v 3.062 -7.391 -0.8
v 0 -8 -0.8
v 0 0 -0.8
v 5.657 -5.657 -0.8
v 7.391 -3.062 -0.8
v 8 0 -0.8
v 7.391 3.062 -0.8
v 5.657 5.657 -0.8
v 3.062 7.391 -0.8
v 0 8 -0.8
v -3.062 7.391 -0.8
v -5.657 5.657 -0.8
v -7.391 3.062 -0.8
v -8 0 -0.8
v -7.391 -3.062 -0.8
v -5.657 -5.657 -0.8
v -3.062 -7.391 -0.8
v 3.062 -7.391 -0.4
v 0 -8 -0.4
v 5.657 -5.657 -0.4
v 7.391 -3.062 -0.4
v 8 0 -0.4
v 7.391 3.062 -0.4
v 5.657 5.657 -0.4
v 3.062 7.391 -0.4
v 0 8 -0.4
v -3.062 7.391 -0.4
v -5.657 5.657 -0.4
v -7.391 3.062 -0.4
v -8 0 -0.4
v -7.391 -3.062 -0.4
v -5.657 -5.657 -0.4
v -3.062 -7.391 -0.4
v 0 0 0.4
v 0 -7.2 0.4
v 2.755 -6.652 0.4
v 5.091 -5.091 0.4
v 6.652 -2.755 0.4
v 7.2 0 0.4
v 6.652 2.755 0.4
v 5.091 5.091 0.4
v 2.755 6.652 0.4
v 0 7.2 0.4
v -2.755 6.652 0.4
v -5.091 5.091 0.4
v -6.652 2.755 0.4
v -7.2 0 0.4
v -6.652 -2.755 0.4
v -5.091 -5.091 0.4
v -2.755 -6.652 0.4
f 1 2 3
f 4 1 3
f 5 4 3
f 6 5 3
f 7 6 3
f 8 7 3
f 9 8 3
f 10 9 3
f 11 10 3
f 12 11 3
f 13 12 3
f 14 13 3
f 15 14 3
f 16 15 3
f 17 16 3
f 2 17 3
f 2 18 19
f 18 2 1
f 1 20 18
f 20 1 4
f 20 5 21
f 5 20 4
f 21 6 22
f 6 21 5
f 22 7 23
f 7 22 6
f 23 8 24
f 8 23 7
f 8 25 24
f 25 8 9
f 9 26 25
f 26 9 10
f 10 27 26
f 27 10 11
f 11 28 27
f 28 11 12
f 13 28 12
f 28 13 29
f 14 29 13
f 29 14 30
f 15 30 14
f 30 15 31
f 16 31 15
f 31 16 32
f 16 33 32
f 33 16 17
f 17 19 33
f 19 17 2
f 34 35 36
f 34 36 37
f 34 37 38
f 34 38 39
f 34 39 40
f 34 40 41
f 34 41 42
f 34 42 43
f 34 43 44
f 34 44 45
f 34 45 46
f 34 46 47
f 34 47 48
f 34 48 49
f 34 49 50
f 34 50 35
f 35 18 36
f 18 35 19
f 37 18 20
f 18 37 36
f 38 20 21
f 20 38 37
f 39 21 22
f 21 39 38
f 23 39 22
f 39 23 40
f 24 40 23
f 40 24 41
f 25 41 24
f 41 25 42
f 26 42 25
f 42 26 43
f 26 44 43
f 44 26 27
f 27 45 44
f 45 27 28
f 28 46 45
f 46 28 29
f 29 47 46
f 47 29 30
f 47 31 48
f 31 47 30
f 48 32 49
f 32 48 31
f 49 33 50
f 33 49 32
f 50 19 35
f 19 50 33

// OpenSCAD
// file: ../p/4-4cyli.scad
use <../lib.scad>
function ldraw_lib__4_4cyli() = [
// 0 Cylinder 1.0
// 0 Name: 4-4cyli.dat
// 0 Author: James Jessiman
// 0 !LDRAW_ORG Primitive UPDATE 2005-01
// 0 !LICENSE Licensed under CC BY 2.0 and CC BY 4.0 : see CAreadme.txt
// 
// 0 BFC CERTIFY CCW
  [0,"BFC","CERTIFY"],
  [0,"BFC","CCW"],
// 
// 0 !HISTORY 1998-12-15 [PTadmin] Official Update 1998-10
// 0 !HISTORY 2002-03-23 [sbliss] Added BFC statement; merged headers from files in distributions LDraw 0.27 and Complete.
// 0 !HISTORY 2002-04-25 [PTadmin] Official Update 2002-02
// 0 !HISTORY 2004-12-14 [guyvivan] BFC CCW
// 0 !HISTORY 2005-12-28 [PTadmin] Official Update 2005-01
// 0 !HISTORY 2007-06-24 [PTadmin] Header formatted for Contributor Agreement
// 0 !HISTORY 2008-07-01 [PTadmin] Official Update 2008-01
// 
// 
// 4 16 1 1 0 0.9239 1 0.3827 0.9239 0 0.3827 1 0 0
  [4,16,1,1,0,0.9239,1,0.3827,0.9239,0,0.3827,1,0,0],
// 5 24 1 0 0 1 1 0 0.9239 0 0.3827 0.9239 0 -0.3827
  [5,24,1,0,0,1,1,0,0.9239,0,0.3827,0.9239,0,-0.3827],
// 4 16 0.9239 1 0.3827 0.7071 1 0.7071 0.7071 0 0.7071 0.9239 0 0.3827
  [4,16,0.9239,1,0.3827,0.7071,1,0.7071,0.7071,0,0.7071,0.9239,0,0.3827],
// 5 24 0.9239 0 0.3827 0.9239 1 0.3827 0.7071 0 0.7071 1 0 0
  [5,24,0.9239,0,0.3827,0.9239,1,0.3827,0.7071,0,0.7071,1,0,0],
// 4 16 0.7071 1 0.7071 0.3827 1 0.9239 0.3827 0 0.9239 0.7071 0 0.7071
  [4,16,0.7071,1,0.7071,0.3827,1,0.9239,0.3827,0,0.9239,0.7071,0,0.7071],
// 5 24 0.7071 0 0.7071 0.7071 1 0.7071 0.3827 0 0.9239 0.9239 0 0.3827
  [5,24,0.7071,0,0.7071,0.7071,1,0.7071,0.3827,0,0.9239,0.9239,0,0.3827],
// 4 16 0.3827 1 0.9239 0 1 1 0 0 1 0.3827 0 0.9239
  [4,16,0.3827,1,0.9239,0,1,1,0,0,1,0.3827,0,0.9239],
// 5 24 0.3827 0 0.9239 0.3827 1 0.9239 0 0 1 0.7071 0 0.7071
  [5,24,0.3827,0,0.9239,0.3827,1,0.9239,0,0,1,0.7071,0,0.7071],
// 4 16 0 1 1 -0.3827 1 0.9239 -0.3827 0 0.9239 0 0 1
  [4,16,0,1,1,-0.3827,1,0.9239,-0.3827,0,0.9239,0,0,1],
// 5 24 0 0 1 0 1 1 -0.3827 0 0.9239 0.3827 0 0.9239
  [5,24,0,0,1,0,1,1,-0.3827,0,0.9239,0.3827,0,0.9239],
// 4 16 -0.3827 1 0.9239 -0.7071 1 0.7071 -0.7071 0 0.7071 -0.3827 0 0.9239
  [4,16,-0.3827,1,0.9239,-0.7071,1,0.7071,-0.7071,0,0.7071,-0.3827,0,0.9239],
// 5 24 -0.3827 0 0.9239 -0.3827 1 0.9239 -0.7071 0 0.7071 0 0 1
  [5,24,-0.3827,0,0.9239,-0.3827,1,0.9239,-0.7071,0,0.7071,0,0,1],
// 4 16 -0.7071 1 0.7071 -0.9239 1 0.3827 -0.9239 0 0.3827 -0.7071 0 0.7071
  [4,16,-0.7071,1,0.7071,-0.9239,1,0.3827,-0.9239,0,0.3827,-0.7071,0,0.7071],
// 5 24 -0.7071 0 0.7071 -0.7071 1 0.7071 -0.9239 0 0.3827 -0.3827 0 0.9239
  [5,24,-0.7071,0,0.7071,-0.7071,1,0.7071,-0.9239,0,0.3827,-0.3827,0,0.9239],
// 4 16 -0.9239 1 0.3827 -1 1 0 -1 0 0 -0.9239 0 0.3827
  [4,16,-0.9239,1,0.3827,-1,1,0,-1,0,0,-0.9239,0,0.3827],
// 5 24 -0.9239 0 0.3827 -0.9239 1 0.3827 -1 0 0 -0.7071 0 0.7071
  [5,24,-0.9239,0,0.3827,-0.9239,1,0.3827,-1,0,0,-0.7071,0,0.7071],
// 4 16 -1 1 0 -0.9239 1 -0.3827 -0.9239 0 -0.3827 -1 0 0
  [4,16,-1,1,0,-0.9239,1,-0.3827,-0.9239,0,-0.3827,-1,0,0],
// 5 24 -1 0 0 -1 1 0 -0.9239 0 -0.3827 -0.9239 0 0.3827
  [5,24,-1,0,0,-1,1,0,-0.9239,0,-0.3827,-0.9239,0,0.3827],
// 4 16 -0.9239 1 -0.3827 -0.7071 1 -0.7071 -0.7071 0 -0.7071 -0.9239 0 -0.3827
  [4,16,-0.9239,1,-0.3827,-0.7071,1,-0.7071,-0.7071,0,-0.7071,-0.9239,0,-0.3827],
// 5 24 -0.9239 0 -0.3827 -0.9239 1 -0.3827 -0.7071 0 -0.7071 -1 0 0
  [5,24,-0.9239,0,-0.3827,-0.9239,1,-0.3827,-0.7071,0,-0.7071,-1,0,0],
// 4 16 -0.7071 1 -0.7071 -0.3827 1 -0.9239 -0.3827 0 -0.9239 -0.7071 0 -0.7071
  [4,16,-0.7071,1,-0.7071,-0.3827,1,-0.9239,-0.3827,0,-0.9239,-0.7071,0,-0.7071],
// 5 24 -0.7071 0 -0.7071 -0.7071 1 -0.7071 -0.3827 0 -0.9239 -0.9239 0 -0.3827
  [5,24,-0.7071,0,-0.7071,-0.7071,1,-0.7071,-0.3827,0,-0.9239,-0.9239,0,-0.3827],
// 4 16 -0.3827 1 -0.9239 0 1 -1 0 0 -1 -0.3827 0 -0.9239
  [4,16,-0.3827,1,-0.9239,0,1,-1,0,0,-1,-0.3827,0,-0.9239],
// 5 24 -0.3827 0 -0.9239 -0.3827 1 -0.9239 0 0 -1 -0.7071 0 -0.7071
  [5,24,-0.3827,0,-0.9239,-0.3827,1,-0.9239,0,0,-1,-0.7071,0,-0.7071],
// 4 16 0 1 -1 0.3827 1 -0.9239 0.3827 0 -0.9239 0 0 -1
  [4,16,0,1,-1,0.3827,1,-0.9239,0.3827,0,-0.9239,0,0,-1],
// 5 24 0 0 -1 0 1 -1 0.3827 0 -0.9239 -0.3827 0 -0.9239
  [5,24,0,0,-1,0,1,-1,0.3827,0,-0.9239,-0.3827,0,-0.9239],
// 4 16 0.3827 1 -0.9239 0.7071 1 -0.7071 0.7071 0 -0.7071 0.3827 0 -0.9239
  [4,16,0.3827,1,-0.9239,0.7071,1,-0.7071,0.7071,0,-0.7071,0.3827,0,-0.9239],
// 5 24 0.3827 0 -0.9239 0.3827 1 -0.9239 0.7071 0 -0.7071 0 0 -1
  [5,24,0.3827,0,-0.9239,0.3827,1,-0.9239,0.7071,0,-0.7071,0,0,-1],
// 4 16 0.7071 1 -0.7071 0.9239 1 -0.3827 0.9239 0 -0.3827 0.7071 0 -0.7071
  [4,16,0.7071,1,-0.7071,0.9239,1,-0.3827,0.9239,0,-0.3827,0.7071,0,-0.7071],
// 5 24 0.7071 0 -0.7071 0.7071 1 -0.7071 0.9239 0 -0.3827 0.3827 0 -0.9239
  [5,24,0.7071,0,-0.7071,0.7071,1,-0.7071,0.9239,0,-0.3827,0.3827,0,-0.9239],
// 4 16 0.9239 1 -0.3827 1 1 0 1 0 0 0.9239 0 -0.3827
  [4,16,0.9239,1,-0.3827,1,1,0,1,0,0,0.9239,0,-0.3827],
// 5 24 0.9239 0 -0.3827 0.9239 1 -0.3827 1 0 0 0.7071 0 -0.7071
  [5,24,0.9239,0,-0.3827,0.9239,1,-0.3827,1,0,0,0.7071,0,-0.7071],
// 0
];
makepoly(ldraw_lib__4_4cyli(), line=0.2);
// file: ../p/4-4edge.scad
use <../lib.scad>
function ldraw_lib__4_4edge() = [
// 0 Circle 1.0
// 0 Name: 4-4edge.dat
// 0 Author: James Jessiman
// 0 !LDRAW_ORG Primitive UPDATE 2017-01
// 0 !LICENSE Licensed under CC BY 2.0 and CC BY 4.0 : see CAreadme.txt
// 
// 0 BFC CERTIFY CCW
  [0,"BFC","CERTIFY"],
  [0,"BFC","CCW"],
// 
// 0 !HISTORY 1998-12-15 [PTadmin] Official Update 1998-10
// 0 !HISTORY 2005-12-28 [PTadmin] Official Update 2005-01
// 0 !HISTORY 2007-06-24 [PTadmin] Header formatted for Contributor Agreement
// 0 !HISTORY 2008-07-01 [PTadmin] Official Update 2008-01
// 0 !HISTORY 2017-01-15 [Steffen] BFCed
// 0 !HISTORY 2017-12-30 [PTadmin] Official Update 2017-01
// 
// 
// 2 24 1 0 0 0.9239 0 0.3827
  [2,24,1,0,0,0.9239,0,0.3827],
// 2 24 0.9239 0 0.3827 0.7071 0 0.7071
  [2,24,0.9239,0,0.3827,0.7071,0,0.7071],
// 2 24 0.7071 0 0.7071 0.3827 0 0.9239
  [2,24,0.7071,0,0.7071,0.3827,0,0.9239],
// 2 24 0.3827 0 0.9239 0 0 1
  [2,24,0.3827,0,0.9239,0,0,1],
// 2 24 0 0 1 -0.3827 0 0.9239
  [2,24,0,0,1,-0.3827,0,0.9239],
// 2 24 -0.3827 0 0.9239 -0.7071 0 0.7071
  [2,24,-0.3827,0,0.9239,-0.7071,0,0.7071],
// 2 24 -0.7071 0 0.7071 -0.9239 0 0.3827
  [2,24,-0.7071,0,0.7071,-0.9239,0,0.3827],
// 2 24 -0.9239 0 0.3827 -1 0 -0
  [2,24,-0.9239,0,0.3827,-1,0,-0],
// 2 24 -1 0 -0 -0.9239 0 -0.3827
  [2,24,-1,0,-0,-0.9239,0,-0.3827],
// 2 24 -0.9239 0 -0.3827 -0.7071 0 -0.7071
  [2,24,-0.9239,0,-0.3827,-0.7071,0,-0.7071],
// 2 24 -0.7071 0 -0.7071 -0.3827 0 -0.9239
  [2,24,-0.7071,0,-0.7071,-0.3827,0,-0.9239],
// 2 24 -0.3827 0 -0.9239 0 0 -1
  [2,24,-0.3827,0,-0.9239,0,0,-1],
// 2 24 0 0 -1 0.3827 0 -0.9239
  [2,24,0,0,-1,0.3827,0,-0.9239],
// 2 24 0.3827 0 -0.9239 0.7071 0 -0.7071
  [2,24,0.3827,0,-0.9239,0.7071,0,-0.7071],
// 2 24 0.7071 0 -0.7071 0.9239 0 -0.3827
  [2,24,0.7071,0,-0.7071,0.9239,0,-0.3827],
// 2 24 0.9239 0 -0.3827 1 0 0
  [2,24,0.9239,0,-0.3827,1,0,0],
];
makepoly(ldraw_lib__4_4edge(), line=0.2);
// file: ../p/4-4disc.scad
use <../lib.scad>
function ldraw_lib__4_4disc() = [
// 0 Disc 1.0
// 0 Name: 4-4disc.dat
// 0 Author: James Jessiman
// 0 !LDRAW_ORG Primitive UPDATE 2002-02
// 0 !LICENSE Licensed under CC BY 2.0 and CC BY 4.0 : see CAreadme.txt
// 
// 0 BFC CERTIFY CCW
  [0,"BFC","CERTIFY"],
  [0,"BFC","CCW"],
// 
// 0 !HISTORY 1998-12-15 [PTadmin] Official Update 1998-10
// 0 !HISTORY 2002-03-23 [sbliss] Added BFC statement
// 0 !HISTORY 2002-04-25 [PTadmin] Official Update 2002-02
// 0 !HISTORY 2007-06-24 [PTadmin] Header formatted for Contributor Agreement
// 0 !HISTORY 2008-07-01 [PTadmin] Official Update 2008-01
// 
// 
// 3 16 0 0 0 1 0 0 0.9239 0 0.3827
  [3,16,0,0,0,1,0,0,0.9239,0,0.3827],
// 3 16 0 0 0 0.9239 0 0.3827 0.7071 0 0.7071
  [3,16,0,0,0,0.9239,0,0.3827,0.7071,0,0.7071],
// 3 16 0 0 0 0.7071 0 0.7071 0.3827 0 0.9239
  [3,16,0,0,0,0.7071,0,0.7071,0.3827,0,0.9239],
// 3 16 0 0 0 0.3827 0 0.9239 0 0 1
  [3,16,0,0,0,0.3827,0,0.9239,0,0,1],
// 3 16 0 0 0 0 0 1 -0.3827 0 0.9239
  [3,16,0,0,0,0,0,1,-0.3827,0,0.9239],
// 3 16 0 0 0 -0.3827 0 0.9239 -0.7071 0 0.7071
  [3,16,0,0,0,-0.3827,0,0.9239,-0.7071,0,0.7071],
// 3 16 0 0 0 -0.7071 0 0.7071 -0.9239 0 0.3827
  [3,16,0,0,0,-0.7071,0,0.7071,-0.9239,0,0.3827],
// 3 16 0 0 0 -0.9239 0 0.3827 -1 0 -0
  [3,16,0,0,0,-0.9239,0,0.3827,-1,0,-0],
// 3 16 0 0 0 -1 0 -0 -0.9239 0 -0.3827
  [3,16,0,0,0,-1,0,-0,-0.9239,0,-0.3827],
// 3 16 0 0 0 -0.9239 0 -0.3827 -0.7071 0 -0.7071
  [3,16,0,0,0,-0.9239,0,-0.3827,-0.7071,0,-0.7071],
// 3 16 0 0 0 -0.7071 0 -0.7071 -0.3827 0 -0.9239
  [3,16,0,0,0,-0.7071,0,-0.7071,-0.3827,0,-0.9239],
// 3 16 0 0 0 -0.3827 0 -0.9239 0 0 -1
  [3,16,0,0,0,-0.3827,0,-0.9239,0,0,-1],
// 3 16 0 0 0 0 0 -1 0.3827 0 -0.9239
  [3,16,0,0,0,0,0,-1,0.3827,0,-0.9239],
// 3 16 0 0 0 0.3827 0 -0.9239 0.7071 0 -0.7071
  [3,16,0,0,0,0.3827,0,-0.9239,0.7071,0,-0.7071],
// 3 16 0 0 0 0.7071 0 -0.7071 0.9239 0 -0.3827
  [3,16,0,0,0,0.7071,0,-0.7071,0.9239,0,-0.3827],
// 3 16 0 0 0 0.9239 0 -0.3827 1 0 0
  [3,16,0,0,0,0.9239,0,-0.3827,1,0,0],
// 0
];
makepoly(ldraw_lib__4_4disc(), line=0.2);
// file: ../p/4-4cylc.scad
use <../lib.scad>
use <4-4cyli.scad>
use <4-4disc.scad>
use <4-4edge.scad>
function ldraw_lib__4_4cylc() = [
// 0 Cylinder Closed 1.0
// 0 Name: 4-4cylc.dat
// 0 Author: Alex Taylor [anathema]
// 0 !LDRAW_ORG Primitive UPDATE 2009-02
// 0 !LICENSE Licensed under CC BY 2.0 and CC BY 4.0 : see CAreadme.txt
// 
// 0 BFC CERTIFY CCW
  [0,"BFC","CERTIFY"],
  [0,"BFC","CCW"],
// 
// 0 !HISTORY 2008-12-29 [cwdee] Removed one disc
// 0 !HISTORY 2009-09-03 [PTadmin] Official Update 2009-02
// 
// 
// 1 16 0 0 0 1 0 0 0 1 0 0 0 1 4-4edge.dat
  [1,16,0,0,0,1,0,0,0,1,0,0,0,1, ldraw_lib__4_4edge()],
// 1 16 0 1 0 1 0 0 0 1 0 0 0 1 4-4edge.dat
  [1,16,0,1,0,1,0,0,0,1,0,0,0,1, ldraw_lib__4_4edge()],
// 1 16 0 0 0 1 0 0 0 1 0 0 0 1 4-4disc.dat
  [1,16,0,0,0,1,0,0,0,1,0,0,0,1, ldraw_lib__4_4disc()],
// 1 16 0 0 0 1 0 0 0 1 0 0 0 1 4-4cyli.dat
  [1,16,0,0,0,1,0,0,0,1,0,0,0,1, ldraw_lib__4_4cyli()],
// 0
];
makepoly(ldraw_lib__4_4cylc(), line=0.2);
// file: ../p/4-4con9.scad
use <../lib.scad>
function ldraw_lib__4_4con9() = [
// 0 Cone  9 x 1.0
// 0 Name: 4-4con9.dat
// 0 Author: John Riley [jriley]
// 0 !LDRAW_ORG Primitive UPDATE 2012-01
// 0 !LICENSE Licensed under CC BY 2.0 and CC BY 4.0 : see CAreadme.txt
// 
// 0 BFC CERTIFY CCW
  [0,"BFC","CERTIFY"],
  [0,"BFC","CCW"],
// 
// 0 !HISTORY 2004-11-06 [PTadmin] Official Update 2004-04
// 0 !HISTORY 2007-06-24 [PTadmin] Header formatted for Contributor Agreement
// 0 !HISTORY 2008-07-01 [PTadmin] Official Update 2008-01
// 0 !HISTORY 2012-02-16 [Philo] Changed to CCW
// 0 !HISTORY 2012-03-30 [PTadmin] Official Update 2012-01
// 
// 
// 4 16 8.3151 1 3.4443 9.239 0 3.827 10 0 0 9 1 0
  [4,16,8.3151,1,3.4443,9.239,0,3.827,10,0,0,9,1,0],
// 4 16 6.3639 1 6.3639 7.071 0 7.071 9.239 0 3.827 8.3151 1 3.4443
  [4,16,6.3639,1,6.3639,7.071,0,7.071,9.239,0,3.827,8.3151,1,3.4443],
// 4 16 3.4443 1 8.3151 3.827 0 9.239 7.071 0 7.071 6.3639 1 6.3639
  [4,16,3.4443,1,8.3151,3.827,0,9.239,7.071,0,7.071,6.3639,1,6.3639],
// 4 16 0 1 9 0 0 10 3.827 0 9.239 3.4443 1 8.3151
  [4,16,0,1,9,0,0,10,3.827,0,9.239,3.4443,1,8.3151],
// 4 16 -3.4443 1 8.3151 -3.827 0 9.239 0 0 10 0 1 9
  [4,16,-3.4443,1,8.3151,-3.827,0,9.239,0,0,10,0,1,9],
// 4 16 -6.3639 1 6.3639 -7.071 0 7.071 -3.827 0 9.239 -3.4443 1 8.3151
  [4,16,-6.3639,1,6.3639,-7.071,0,7.071,-3.827,0,9.239,-3.4443,1,8.3151],
// 4 16 -8.3151 1 3.4443 -9.239 0 3.827 -7.071 0 7.071 -6.3639 1 6.3639
  [4,16,-8.3151,1,3.4443,-9.239,0,3.827,-7.071,0,7.071,-6.3639,1,6.3639],
// 4 16 -9 1 0 -10 0 0 -9.239 0 3.827 -8.3151 1 3.4443
  [4,16,-9,1,0,-10,0,0,-9.239,0,3.827,-8.3151,1,3.4443],
// 4 16 -8.3151 1 -3.4443 -9.239 0 -3.827 -10 0 0 -9 1 0
  [4,16,-8.3151,1,-3.4443,-9.239,0,-3.827,-10,0,0,-9,1,0],
// 4 16 -6.3639 1 -6.3639 -7.071 0 -7.071 -9.239 0 -3.827 -8.3151 1 -3.4443
  [4,16,-6.3639,1,-6.3639,-7.071,0,-7.071,-9.239,0,-3.827,-8.3151,1,-3.4443],
// 4 16 -3.4443 1 -8.3151 -3.827 0 -9.239 -7.071 0 -7.071 -6.3639 1 -6.3639
  [4,16,-3.4443,1,-8.3151,-3.827,0,-9.239,-7.071,0,-7.071,-6.3639,1,-6.3639],
// 4 16 0 1 -9 0 0 -10 -3.827 0 -9.239 -3.4443 1 -8.3151
  [4,16,0,1,-9,0,0,-10,-3.827,0,-9.239,-3.4443,1,-8.3151],
// 4 16 3.4443 1 -8.3151 3.827 0 -9.239 0 0 -10 0 1 -9
  [4,16,3.4443,1,-8.3151,3.827,0,-9.239,0,0,-10,0,1,-9],
// 4 16 6.3639 1 -6.3639 7.071 0 -7.071 3.827 0 -9.239 3.4443 1 -8.3151
  [4,16,6.3639,1,-6.3639,7.071,0,-7.071,3.827,0,-9.239,3.4443,1,-8.3151],
// 4 16 8.3151 1 -3.4443 9.239 0 -3.827 7.071 0 -7.071 6.3639 1 -6.3639
  [4,16,8.3151,1,-3.4443,9.239,0,-3.827,7.071,0,-7.071,6.3639,1,-6.3639],
// 4 16 9 1 0 10 0 0 9.239 0 -3.827 8.3151 1 -3.4443
  [4,16,9,1,0,10,0,0,9.239,0,-3.827,8.3151,1,-3.4443],
// 
// 5 24 9 1 0 10 0 0 8.3151 1 -3.4443 8.3151 1 3.4443
  [5,24,9,1,0,10,0,0,8.3151,1,-3.4443,8.3151,1,3.4443],
// 5 24 8.3151 1 3.4443 9.239 0 3.827 9 1 0 6.3639 1 6.3639
  [5,24,8.3151,1,3.4443,9.239,0,3.827,9,1,0,6.3639,1,6.3639],
// 5 24 6.3639 1 6.3639 7.071 0 7.071 8.3151 1 3.4443 3.4443 1 8.3151
  [5,24,6.3639,1,6.3639,7.071,0,7.071,8.3151,1,3.4443,3.4443,1,8.3151],
// 5 24 3.4443 1 8.3151 3.827 0 9.239 6.3639 1 6.3639 0 1 9
  [5,24,3.4443,1,8.3151,3.827,0,9.239,6.3639,1,6.3639,0,1,9],
// 5 24 0 1 9 0 0 10 3.4443 1 8.3151 -3.4443 1 8.3151
  [5,24,0,1,9,0,0,10,3.4443,1,8.3151,-3.4443,1,8.3151],
// 5 24 -3.4443 1 8.3151 -3.827 0 9.239 0 1 9 -6.3639 1 6.3639
  [5,24,-3.4443,1,8.3151,-3.827,0,9.239,0,1,9,-6.3639,1,6.3639],
// 5 24 -6.3639 1 6.3639 -7.071 0 7.071 -3.4443 1 8.3151 -8.3151 1 3.4443
  [5,24,-6.3639,1,6.3639,-7.071,0,7.071,-3.4443,1,8.3151,-8.3151,1,3.4443],
// 5 24 -8.3151 1 3.4443 -9.239 0 3.827 -6.3639 1 6.3639 -9 1 0
  [5,24,-8.3151,1,3.4443,-9.239,0,3.827,-6.3639,1,6.3639,-9,1,0],
// 5 24 -9 1 0 -10 0 0 -8.3151 1 3.4443 -8.3151 1 -3.4443
  [5,24,-9,1,0,-10,0,0,-8.3151,1,3.4443,-8.3151,1,-3.4443],
// 5 24 -8.3151 1 -3.4443 -9.239 0 -3.827 -9 1 0 -6.3639 1 -6.3639
  [5,24,-8.3151,1,-3.4443,-9.239,0,-3.827,-9,1,0,-6.3639,1,-6.3639],
// 5 24 -6.3639 1 -6.3639 -7.071 0 -7.071 -8.3151 1 -3.4443 -3.4443 1 -8.3151
  [5,24,-6.3639,1,-6.3639,-7.071,0,-7.071,-8.3151,1,-3.4443,-3.4443,1,-8.3151],
// 5 24 -3.4443 1 -8.3151 -3.827 0 -9.239 -6.3639 1 -6.3639 0 1 -9
  [5,24,-3.4443,1,-8.3151,-3.827,0,-9.239,-6.3639,1,-6.3639,0,1,-9],
// 5 24 0 1 -9 0 0 -10 -3.4443 1 -8.3151 3.4443 1 -8.3151
  [5,24,0,1,-9,0,0,-10,-3.4443,1,-8.3151,3.4443,1,-8.3151],
// 5 24 3.4443 1 -8.3151 3.827 0 -9.239 0 1 -9 6.3639 1 -6.3639
  [5,24,3.4443,1,-8.3151,3.827,0,-9.239,0,1,-9,6.3639,1,-6.3639],
// 5 24 6.3639 1 -6.3639 7.071 0 -7.071 3.4443 1 -8.3151 8.3151 1 -3.4443
  [5,24,6.3639,1,-6.3639,7.071,0,-7.071,3.4443,1,-8.3151,8.3151,1,-3.4443],
// 5 24 8.3151 1 -3.4443 9.239 0 -3.827 6.3639 1 -6.3639 9 1 0
  [5,24,8.3151,1,-3.4443,9.239,0,-3.827,6.3639,1,-6.3639,9,1,0],
];
makepoly(ldraw_lib__4_4con9(), line=0.2);
// main file
use <../lib.scad>
use <../p/4-4con9.scad>
use <../p/4-4cylc.scad>
use <../p/4-4disc.scad>
use <../p/4-4edge.scad>
function ldraw_lib__u9565() = [
// 0 Electric Record and Play Brick 16 x 10 x  4 Off Button
// 0 Name: u9565.dat
// 0 Author: Philippe Hurbain [Philo]
// 0 !LDRAW_ORG Part UPDATE 2022-03
// 0 !LICENSE Licensed under CC BY 2.0 and CC BY 4.0 : see CAreadme.txt
// 
// 0 BFC CERTIFY CCW
  [0,"BFC","CERTIFY"],
  [0,"BFC","CCW"],
// 
// 0 !HISTORY 2022-05-07 [PTadmin] Official Update 2022-03
// 
// 
// 1 16 0 2 0 0 0 20 0 -1 0 -20 0 0 4-4cylc.dat
  [1,16,0,2,0,0,0,20,0,-1,0,-20,0,0, ldraw_lib__4_4cylc()],
// 1 16 0 -1 0 0 0 18 0 1 0 -18 0 0 4-4disc.dat
  [1,16,0,-1,0,0,0,18,0,1,0,-18,0,0, ldraw_lib__4_4disc()],
// 1 16 0 -1 0 0 0 18 0 1 0 -18 0 0 4-4edge.dat
  [1,16,0,-1,0,0,0,18,0,1,0,-18,0,0, ldraw_lib__4_4edge()],
// 1 16 0 1 0 0 0 2 0 -2 0 -2 0 0 4-4con9.dat
  [1,16,0,1,0,0,0,2,0,-2,0,-2,0,0, ldraw_lib__4_4con9()],
];
makepoly(ldraw_lib__u9565(), line=0.2);
